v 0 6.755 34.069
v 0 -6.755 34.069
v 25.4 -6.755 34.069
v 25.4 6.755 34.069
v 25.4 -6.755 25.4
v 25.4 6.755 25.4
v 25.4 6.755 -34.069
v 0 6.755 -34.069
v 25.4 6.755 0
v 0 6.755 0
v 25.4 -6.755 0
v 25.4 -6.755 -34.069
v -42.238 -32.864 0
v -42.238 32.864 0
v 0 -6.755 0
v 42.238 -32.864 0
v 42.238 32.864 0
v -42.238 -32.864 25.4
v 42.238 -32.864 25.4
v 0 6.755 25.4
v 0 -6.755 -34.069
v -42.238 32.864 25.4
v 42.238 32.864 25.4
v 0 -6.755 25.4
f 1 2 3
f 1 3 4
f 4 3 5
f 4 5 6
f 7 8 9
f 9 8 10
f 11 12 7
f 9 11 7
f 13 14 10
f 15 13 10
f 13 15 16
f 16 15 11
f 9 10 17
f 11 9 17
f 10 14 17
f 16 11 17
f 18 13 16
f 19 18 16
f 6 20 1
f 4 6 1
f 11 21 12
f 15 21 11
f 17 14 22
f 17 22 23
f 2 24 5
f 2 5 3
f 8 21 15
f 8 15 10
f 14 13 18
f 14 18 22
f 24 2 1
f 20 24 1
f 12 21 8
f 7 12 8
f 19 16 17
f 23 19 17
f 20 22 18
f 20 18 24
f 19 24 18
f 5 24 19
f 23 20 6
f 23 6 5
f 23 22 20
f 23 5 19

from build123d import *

# Parameters (mm, degrees)
F1_W     = 84.4765
F1_H     = 65.728918
F2_DEPTH = 25.4
F0_W     = 13.509872
F0_H     = 68.137058
F3_DEPTH = 25.4


with BuildPart() as f2:
    # F1 (on Top) → F2 (new body)
    with BuildSketch(Plane.XY):
        Rectangle(F1_W, F1_H)
    extrude(amount=F2_DEPTH)

    # F0 (on Right) → F3 (join)
    with BuildSketch(Plane.YZ):
        Rectangle(F0_W, F0_H)
    extrude(amount=F3_DEPTH)


solid = f2.part
